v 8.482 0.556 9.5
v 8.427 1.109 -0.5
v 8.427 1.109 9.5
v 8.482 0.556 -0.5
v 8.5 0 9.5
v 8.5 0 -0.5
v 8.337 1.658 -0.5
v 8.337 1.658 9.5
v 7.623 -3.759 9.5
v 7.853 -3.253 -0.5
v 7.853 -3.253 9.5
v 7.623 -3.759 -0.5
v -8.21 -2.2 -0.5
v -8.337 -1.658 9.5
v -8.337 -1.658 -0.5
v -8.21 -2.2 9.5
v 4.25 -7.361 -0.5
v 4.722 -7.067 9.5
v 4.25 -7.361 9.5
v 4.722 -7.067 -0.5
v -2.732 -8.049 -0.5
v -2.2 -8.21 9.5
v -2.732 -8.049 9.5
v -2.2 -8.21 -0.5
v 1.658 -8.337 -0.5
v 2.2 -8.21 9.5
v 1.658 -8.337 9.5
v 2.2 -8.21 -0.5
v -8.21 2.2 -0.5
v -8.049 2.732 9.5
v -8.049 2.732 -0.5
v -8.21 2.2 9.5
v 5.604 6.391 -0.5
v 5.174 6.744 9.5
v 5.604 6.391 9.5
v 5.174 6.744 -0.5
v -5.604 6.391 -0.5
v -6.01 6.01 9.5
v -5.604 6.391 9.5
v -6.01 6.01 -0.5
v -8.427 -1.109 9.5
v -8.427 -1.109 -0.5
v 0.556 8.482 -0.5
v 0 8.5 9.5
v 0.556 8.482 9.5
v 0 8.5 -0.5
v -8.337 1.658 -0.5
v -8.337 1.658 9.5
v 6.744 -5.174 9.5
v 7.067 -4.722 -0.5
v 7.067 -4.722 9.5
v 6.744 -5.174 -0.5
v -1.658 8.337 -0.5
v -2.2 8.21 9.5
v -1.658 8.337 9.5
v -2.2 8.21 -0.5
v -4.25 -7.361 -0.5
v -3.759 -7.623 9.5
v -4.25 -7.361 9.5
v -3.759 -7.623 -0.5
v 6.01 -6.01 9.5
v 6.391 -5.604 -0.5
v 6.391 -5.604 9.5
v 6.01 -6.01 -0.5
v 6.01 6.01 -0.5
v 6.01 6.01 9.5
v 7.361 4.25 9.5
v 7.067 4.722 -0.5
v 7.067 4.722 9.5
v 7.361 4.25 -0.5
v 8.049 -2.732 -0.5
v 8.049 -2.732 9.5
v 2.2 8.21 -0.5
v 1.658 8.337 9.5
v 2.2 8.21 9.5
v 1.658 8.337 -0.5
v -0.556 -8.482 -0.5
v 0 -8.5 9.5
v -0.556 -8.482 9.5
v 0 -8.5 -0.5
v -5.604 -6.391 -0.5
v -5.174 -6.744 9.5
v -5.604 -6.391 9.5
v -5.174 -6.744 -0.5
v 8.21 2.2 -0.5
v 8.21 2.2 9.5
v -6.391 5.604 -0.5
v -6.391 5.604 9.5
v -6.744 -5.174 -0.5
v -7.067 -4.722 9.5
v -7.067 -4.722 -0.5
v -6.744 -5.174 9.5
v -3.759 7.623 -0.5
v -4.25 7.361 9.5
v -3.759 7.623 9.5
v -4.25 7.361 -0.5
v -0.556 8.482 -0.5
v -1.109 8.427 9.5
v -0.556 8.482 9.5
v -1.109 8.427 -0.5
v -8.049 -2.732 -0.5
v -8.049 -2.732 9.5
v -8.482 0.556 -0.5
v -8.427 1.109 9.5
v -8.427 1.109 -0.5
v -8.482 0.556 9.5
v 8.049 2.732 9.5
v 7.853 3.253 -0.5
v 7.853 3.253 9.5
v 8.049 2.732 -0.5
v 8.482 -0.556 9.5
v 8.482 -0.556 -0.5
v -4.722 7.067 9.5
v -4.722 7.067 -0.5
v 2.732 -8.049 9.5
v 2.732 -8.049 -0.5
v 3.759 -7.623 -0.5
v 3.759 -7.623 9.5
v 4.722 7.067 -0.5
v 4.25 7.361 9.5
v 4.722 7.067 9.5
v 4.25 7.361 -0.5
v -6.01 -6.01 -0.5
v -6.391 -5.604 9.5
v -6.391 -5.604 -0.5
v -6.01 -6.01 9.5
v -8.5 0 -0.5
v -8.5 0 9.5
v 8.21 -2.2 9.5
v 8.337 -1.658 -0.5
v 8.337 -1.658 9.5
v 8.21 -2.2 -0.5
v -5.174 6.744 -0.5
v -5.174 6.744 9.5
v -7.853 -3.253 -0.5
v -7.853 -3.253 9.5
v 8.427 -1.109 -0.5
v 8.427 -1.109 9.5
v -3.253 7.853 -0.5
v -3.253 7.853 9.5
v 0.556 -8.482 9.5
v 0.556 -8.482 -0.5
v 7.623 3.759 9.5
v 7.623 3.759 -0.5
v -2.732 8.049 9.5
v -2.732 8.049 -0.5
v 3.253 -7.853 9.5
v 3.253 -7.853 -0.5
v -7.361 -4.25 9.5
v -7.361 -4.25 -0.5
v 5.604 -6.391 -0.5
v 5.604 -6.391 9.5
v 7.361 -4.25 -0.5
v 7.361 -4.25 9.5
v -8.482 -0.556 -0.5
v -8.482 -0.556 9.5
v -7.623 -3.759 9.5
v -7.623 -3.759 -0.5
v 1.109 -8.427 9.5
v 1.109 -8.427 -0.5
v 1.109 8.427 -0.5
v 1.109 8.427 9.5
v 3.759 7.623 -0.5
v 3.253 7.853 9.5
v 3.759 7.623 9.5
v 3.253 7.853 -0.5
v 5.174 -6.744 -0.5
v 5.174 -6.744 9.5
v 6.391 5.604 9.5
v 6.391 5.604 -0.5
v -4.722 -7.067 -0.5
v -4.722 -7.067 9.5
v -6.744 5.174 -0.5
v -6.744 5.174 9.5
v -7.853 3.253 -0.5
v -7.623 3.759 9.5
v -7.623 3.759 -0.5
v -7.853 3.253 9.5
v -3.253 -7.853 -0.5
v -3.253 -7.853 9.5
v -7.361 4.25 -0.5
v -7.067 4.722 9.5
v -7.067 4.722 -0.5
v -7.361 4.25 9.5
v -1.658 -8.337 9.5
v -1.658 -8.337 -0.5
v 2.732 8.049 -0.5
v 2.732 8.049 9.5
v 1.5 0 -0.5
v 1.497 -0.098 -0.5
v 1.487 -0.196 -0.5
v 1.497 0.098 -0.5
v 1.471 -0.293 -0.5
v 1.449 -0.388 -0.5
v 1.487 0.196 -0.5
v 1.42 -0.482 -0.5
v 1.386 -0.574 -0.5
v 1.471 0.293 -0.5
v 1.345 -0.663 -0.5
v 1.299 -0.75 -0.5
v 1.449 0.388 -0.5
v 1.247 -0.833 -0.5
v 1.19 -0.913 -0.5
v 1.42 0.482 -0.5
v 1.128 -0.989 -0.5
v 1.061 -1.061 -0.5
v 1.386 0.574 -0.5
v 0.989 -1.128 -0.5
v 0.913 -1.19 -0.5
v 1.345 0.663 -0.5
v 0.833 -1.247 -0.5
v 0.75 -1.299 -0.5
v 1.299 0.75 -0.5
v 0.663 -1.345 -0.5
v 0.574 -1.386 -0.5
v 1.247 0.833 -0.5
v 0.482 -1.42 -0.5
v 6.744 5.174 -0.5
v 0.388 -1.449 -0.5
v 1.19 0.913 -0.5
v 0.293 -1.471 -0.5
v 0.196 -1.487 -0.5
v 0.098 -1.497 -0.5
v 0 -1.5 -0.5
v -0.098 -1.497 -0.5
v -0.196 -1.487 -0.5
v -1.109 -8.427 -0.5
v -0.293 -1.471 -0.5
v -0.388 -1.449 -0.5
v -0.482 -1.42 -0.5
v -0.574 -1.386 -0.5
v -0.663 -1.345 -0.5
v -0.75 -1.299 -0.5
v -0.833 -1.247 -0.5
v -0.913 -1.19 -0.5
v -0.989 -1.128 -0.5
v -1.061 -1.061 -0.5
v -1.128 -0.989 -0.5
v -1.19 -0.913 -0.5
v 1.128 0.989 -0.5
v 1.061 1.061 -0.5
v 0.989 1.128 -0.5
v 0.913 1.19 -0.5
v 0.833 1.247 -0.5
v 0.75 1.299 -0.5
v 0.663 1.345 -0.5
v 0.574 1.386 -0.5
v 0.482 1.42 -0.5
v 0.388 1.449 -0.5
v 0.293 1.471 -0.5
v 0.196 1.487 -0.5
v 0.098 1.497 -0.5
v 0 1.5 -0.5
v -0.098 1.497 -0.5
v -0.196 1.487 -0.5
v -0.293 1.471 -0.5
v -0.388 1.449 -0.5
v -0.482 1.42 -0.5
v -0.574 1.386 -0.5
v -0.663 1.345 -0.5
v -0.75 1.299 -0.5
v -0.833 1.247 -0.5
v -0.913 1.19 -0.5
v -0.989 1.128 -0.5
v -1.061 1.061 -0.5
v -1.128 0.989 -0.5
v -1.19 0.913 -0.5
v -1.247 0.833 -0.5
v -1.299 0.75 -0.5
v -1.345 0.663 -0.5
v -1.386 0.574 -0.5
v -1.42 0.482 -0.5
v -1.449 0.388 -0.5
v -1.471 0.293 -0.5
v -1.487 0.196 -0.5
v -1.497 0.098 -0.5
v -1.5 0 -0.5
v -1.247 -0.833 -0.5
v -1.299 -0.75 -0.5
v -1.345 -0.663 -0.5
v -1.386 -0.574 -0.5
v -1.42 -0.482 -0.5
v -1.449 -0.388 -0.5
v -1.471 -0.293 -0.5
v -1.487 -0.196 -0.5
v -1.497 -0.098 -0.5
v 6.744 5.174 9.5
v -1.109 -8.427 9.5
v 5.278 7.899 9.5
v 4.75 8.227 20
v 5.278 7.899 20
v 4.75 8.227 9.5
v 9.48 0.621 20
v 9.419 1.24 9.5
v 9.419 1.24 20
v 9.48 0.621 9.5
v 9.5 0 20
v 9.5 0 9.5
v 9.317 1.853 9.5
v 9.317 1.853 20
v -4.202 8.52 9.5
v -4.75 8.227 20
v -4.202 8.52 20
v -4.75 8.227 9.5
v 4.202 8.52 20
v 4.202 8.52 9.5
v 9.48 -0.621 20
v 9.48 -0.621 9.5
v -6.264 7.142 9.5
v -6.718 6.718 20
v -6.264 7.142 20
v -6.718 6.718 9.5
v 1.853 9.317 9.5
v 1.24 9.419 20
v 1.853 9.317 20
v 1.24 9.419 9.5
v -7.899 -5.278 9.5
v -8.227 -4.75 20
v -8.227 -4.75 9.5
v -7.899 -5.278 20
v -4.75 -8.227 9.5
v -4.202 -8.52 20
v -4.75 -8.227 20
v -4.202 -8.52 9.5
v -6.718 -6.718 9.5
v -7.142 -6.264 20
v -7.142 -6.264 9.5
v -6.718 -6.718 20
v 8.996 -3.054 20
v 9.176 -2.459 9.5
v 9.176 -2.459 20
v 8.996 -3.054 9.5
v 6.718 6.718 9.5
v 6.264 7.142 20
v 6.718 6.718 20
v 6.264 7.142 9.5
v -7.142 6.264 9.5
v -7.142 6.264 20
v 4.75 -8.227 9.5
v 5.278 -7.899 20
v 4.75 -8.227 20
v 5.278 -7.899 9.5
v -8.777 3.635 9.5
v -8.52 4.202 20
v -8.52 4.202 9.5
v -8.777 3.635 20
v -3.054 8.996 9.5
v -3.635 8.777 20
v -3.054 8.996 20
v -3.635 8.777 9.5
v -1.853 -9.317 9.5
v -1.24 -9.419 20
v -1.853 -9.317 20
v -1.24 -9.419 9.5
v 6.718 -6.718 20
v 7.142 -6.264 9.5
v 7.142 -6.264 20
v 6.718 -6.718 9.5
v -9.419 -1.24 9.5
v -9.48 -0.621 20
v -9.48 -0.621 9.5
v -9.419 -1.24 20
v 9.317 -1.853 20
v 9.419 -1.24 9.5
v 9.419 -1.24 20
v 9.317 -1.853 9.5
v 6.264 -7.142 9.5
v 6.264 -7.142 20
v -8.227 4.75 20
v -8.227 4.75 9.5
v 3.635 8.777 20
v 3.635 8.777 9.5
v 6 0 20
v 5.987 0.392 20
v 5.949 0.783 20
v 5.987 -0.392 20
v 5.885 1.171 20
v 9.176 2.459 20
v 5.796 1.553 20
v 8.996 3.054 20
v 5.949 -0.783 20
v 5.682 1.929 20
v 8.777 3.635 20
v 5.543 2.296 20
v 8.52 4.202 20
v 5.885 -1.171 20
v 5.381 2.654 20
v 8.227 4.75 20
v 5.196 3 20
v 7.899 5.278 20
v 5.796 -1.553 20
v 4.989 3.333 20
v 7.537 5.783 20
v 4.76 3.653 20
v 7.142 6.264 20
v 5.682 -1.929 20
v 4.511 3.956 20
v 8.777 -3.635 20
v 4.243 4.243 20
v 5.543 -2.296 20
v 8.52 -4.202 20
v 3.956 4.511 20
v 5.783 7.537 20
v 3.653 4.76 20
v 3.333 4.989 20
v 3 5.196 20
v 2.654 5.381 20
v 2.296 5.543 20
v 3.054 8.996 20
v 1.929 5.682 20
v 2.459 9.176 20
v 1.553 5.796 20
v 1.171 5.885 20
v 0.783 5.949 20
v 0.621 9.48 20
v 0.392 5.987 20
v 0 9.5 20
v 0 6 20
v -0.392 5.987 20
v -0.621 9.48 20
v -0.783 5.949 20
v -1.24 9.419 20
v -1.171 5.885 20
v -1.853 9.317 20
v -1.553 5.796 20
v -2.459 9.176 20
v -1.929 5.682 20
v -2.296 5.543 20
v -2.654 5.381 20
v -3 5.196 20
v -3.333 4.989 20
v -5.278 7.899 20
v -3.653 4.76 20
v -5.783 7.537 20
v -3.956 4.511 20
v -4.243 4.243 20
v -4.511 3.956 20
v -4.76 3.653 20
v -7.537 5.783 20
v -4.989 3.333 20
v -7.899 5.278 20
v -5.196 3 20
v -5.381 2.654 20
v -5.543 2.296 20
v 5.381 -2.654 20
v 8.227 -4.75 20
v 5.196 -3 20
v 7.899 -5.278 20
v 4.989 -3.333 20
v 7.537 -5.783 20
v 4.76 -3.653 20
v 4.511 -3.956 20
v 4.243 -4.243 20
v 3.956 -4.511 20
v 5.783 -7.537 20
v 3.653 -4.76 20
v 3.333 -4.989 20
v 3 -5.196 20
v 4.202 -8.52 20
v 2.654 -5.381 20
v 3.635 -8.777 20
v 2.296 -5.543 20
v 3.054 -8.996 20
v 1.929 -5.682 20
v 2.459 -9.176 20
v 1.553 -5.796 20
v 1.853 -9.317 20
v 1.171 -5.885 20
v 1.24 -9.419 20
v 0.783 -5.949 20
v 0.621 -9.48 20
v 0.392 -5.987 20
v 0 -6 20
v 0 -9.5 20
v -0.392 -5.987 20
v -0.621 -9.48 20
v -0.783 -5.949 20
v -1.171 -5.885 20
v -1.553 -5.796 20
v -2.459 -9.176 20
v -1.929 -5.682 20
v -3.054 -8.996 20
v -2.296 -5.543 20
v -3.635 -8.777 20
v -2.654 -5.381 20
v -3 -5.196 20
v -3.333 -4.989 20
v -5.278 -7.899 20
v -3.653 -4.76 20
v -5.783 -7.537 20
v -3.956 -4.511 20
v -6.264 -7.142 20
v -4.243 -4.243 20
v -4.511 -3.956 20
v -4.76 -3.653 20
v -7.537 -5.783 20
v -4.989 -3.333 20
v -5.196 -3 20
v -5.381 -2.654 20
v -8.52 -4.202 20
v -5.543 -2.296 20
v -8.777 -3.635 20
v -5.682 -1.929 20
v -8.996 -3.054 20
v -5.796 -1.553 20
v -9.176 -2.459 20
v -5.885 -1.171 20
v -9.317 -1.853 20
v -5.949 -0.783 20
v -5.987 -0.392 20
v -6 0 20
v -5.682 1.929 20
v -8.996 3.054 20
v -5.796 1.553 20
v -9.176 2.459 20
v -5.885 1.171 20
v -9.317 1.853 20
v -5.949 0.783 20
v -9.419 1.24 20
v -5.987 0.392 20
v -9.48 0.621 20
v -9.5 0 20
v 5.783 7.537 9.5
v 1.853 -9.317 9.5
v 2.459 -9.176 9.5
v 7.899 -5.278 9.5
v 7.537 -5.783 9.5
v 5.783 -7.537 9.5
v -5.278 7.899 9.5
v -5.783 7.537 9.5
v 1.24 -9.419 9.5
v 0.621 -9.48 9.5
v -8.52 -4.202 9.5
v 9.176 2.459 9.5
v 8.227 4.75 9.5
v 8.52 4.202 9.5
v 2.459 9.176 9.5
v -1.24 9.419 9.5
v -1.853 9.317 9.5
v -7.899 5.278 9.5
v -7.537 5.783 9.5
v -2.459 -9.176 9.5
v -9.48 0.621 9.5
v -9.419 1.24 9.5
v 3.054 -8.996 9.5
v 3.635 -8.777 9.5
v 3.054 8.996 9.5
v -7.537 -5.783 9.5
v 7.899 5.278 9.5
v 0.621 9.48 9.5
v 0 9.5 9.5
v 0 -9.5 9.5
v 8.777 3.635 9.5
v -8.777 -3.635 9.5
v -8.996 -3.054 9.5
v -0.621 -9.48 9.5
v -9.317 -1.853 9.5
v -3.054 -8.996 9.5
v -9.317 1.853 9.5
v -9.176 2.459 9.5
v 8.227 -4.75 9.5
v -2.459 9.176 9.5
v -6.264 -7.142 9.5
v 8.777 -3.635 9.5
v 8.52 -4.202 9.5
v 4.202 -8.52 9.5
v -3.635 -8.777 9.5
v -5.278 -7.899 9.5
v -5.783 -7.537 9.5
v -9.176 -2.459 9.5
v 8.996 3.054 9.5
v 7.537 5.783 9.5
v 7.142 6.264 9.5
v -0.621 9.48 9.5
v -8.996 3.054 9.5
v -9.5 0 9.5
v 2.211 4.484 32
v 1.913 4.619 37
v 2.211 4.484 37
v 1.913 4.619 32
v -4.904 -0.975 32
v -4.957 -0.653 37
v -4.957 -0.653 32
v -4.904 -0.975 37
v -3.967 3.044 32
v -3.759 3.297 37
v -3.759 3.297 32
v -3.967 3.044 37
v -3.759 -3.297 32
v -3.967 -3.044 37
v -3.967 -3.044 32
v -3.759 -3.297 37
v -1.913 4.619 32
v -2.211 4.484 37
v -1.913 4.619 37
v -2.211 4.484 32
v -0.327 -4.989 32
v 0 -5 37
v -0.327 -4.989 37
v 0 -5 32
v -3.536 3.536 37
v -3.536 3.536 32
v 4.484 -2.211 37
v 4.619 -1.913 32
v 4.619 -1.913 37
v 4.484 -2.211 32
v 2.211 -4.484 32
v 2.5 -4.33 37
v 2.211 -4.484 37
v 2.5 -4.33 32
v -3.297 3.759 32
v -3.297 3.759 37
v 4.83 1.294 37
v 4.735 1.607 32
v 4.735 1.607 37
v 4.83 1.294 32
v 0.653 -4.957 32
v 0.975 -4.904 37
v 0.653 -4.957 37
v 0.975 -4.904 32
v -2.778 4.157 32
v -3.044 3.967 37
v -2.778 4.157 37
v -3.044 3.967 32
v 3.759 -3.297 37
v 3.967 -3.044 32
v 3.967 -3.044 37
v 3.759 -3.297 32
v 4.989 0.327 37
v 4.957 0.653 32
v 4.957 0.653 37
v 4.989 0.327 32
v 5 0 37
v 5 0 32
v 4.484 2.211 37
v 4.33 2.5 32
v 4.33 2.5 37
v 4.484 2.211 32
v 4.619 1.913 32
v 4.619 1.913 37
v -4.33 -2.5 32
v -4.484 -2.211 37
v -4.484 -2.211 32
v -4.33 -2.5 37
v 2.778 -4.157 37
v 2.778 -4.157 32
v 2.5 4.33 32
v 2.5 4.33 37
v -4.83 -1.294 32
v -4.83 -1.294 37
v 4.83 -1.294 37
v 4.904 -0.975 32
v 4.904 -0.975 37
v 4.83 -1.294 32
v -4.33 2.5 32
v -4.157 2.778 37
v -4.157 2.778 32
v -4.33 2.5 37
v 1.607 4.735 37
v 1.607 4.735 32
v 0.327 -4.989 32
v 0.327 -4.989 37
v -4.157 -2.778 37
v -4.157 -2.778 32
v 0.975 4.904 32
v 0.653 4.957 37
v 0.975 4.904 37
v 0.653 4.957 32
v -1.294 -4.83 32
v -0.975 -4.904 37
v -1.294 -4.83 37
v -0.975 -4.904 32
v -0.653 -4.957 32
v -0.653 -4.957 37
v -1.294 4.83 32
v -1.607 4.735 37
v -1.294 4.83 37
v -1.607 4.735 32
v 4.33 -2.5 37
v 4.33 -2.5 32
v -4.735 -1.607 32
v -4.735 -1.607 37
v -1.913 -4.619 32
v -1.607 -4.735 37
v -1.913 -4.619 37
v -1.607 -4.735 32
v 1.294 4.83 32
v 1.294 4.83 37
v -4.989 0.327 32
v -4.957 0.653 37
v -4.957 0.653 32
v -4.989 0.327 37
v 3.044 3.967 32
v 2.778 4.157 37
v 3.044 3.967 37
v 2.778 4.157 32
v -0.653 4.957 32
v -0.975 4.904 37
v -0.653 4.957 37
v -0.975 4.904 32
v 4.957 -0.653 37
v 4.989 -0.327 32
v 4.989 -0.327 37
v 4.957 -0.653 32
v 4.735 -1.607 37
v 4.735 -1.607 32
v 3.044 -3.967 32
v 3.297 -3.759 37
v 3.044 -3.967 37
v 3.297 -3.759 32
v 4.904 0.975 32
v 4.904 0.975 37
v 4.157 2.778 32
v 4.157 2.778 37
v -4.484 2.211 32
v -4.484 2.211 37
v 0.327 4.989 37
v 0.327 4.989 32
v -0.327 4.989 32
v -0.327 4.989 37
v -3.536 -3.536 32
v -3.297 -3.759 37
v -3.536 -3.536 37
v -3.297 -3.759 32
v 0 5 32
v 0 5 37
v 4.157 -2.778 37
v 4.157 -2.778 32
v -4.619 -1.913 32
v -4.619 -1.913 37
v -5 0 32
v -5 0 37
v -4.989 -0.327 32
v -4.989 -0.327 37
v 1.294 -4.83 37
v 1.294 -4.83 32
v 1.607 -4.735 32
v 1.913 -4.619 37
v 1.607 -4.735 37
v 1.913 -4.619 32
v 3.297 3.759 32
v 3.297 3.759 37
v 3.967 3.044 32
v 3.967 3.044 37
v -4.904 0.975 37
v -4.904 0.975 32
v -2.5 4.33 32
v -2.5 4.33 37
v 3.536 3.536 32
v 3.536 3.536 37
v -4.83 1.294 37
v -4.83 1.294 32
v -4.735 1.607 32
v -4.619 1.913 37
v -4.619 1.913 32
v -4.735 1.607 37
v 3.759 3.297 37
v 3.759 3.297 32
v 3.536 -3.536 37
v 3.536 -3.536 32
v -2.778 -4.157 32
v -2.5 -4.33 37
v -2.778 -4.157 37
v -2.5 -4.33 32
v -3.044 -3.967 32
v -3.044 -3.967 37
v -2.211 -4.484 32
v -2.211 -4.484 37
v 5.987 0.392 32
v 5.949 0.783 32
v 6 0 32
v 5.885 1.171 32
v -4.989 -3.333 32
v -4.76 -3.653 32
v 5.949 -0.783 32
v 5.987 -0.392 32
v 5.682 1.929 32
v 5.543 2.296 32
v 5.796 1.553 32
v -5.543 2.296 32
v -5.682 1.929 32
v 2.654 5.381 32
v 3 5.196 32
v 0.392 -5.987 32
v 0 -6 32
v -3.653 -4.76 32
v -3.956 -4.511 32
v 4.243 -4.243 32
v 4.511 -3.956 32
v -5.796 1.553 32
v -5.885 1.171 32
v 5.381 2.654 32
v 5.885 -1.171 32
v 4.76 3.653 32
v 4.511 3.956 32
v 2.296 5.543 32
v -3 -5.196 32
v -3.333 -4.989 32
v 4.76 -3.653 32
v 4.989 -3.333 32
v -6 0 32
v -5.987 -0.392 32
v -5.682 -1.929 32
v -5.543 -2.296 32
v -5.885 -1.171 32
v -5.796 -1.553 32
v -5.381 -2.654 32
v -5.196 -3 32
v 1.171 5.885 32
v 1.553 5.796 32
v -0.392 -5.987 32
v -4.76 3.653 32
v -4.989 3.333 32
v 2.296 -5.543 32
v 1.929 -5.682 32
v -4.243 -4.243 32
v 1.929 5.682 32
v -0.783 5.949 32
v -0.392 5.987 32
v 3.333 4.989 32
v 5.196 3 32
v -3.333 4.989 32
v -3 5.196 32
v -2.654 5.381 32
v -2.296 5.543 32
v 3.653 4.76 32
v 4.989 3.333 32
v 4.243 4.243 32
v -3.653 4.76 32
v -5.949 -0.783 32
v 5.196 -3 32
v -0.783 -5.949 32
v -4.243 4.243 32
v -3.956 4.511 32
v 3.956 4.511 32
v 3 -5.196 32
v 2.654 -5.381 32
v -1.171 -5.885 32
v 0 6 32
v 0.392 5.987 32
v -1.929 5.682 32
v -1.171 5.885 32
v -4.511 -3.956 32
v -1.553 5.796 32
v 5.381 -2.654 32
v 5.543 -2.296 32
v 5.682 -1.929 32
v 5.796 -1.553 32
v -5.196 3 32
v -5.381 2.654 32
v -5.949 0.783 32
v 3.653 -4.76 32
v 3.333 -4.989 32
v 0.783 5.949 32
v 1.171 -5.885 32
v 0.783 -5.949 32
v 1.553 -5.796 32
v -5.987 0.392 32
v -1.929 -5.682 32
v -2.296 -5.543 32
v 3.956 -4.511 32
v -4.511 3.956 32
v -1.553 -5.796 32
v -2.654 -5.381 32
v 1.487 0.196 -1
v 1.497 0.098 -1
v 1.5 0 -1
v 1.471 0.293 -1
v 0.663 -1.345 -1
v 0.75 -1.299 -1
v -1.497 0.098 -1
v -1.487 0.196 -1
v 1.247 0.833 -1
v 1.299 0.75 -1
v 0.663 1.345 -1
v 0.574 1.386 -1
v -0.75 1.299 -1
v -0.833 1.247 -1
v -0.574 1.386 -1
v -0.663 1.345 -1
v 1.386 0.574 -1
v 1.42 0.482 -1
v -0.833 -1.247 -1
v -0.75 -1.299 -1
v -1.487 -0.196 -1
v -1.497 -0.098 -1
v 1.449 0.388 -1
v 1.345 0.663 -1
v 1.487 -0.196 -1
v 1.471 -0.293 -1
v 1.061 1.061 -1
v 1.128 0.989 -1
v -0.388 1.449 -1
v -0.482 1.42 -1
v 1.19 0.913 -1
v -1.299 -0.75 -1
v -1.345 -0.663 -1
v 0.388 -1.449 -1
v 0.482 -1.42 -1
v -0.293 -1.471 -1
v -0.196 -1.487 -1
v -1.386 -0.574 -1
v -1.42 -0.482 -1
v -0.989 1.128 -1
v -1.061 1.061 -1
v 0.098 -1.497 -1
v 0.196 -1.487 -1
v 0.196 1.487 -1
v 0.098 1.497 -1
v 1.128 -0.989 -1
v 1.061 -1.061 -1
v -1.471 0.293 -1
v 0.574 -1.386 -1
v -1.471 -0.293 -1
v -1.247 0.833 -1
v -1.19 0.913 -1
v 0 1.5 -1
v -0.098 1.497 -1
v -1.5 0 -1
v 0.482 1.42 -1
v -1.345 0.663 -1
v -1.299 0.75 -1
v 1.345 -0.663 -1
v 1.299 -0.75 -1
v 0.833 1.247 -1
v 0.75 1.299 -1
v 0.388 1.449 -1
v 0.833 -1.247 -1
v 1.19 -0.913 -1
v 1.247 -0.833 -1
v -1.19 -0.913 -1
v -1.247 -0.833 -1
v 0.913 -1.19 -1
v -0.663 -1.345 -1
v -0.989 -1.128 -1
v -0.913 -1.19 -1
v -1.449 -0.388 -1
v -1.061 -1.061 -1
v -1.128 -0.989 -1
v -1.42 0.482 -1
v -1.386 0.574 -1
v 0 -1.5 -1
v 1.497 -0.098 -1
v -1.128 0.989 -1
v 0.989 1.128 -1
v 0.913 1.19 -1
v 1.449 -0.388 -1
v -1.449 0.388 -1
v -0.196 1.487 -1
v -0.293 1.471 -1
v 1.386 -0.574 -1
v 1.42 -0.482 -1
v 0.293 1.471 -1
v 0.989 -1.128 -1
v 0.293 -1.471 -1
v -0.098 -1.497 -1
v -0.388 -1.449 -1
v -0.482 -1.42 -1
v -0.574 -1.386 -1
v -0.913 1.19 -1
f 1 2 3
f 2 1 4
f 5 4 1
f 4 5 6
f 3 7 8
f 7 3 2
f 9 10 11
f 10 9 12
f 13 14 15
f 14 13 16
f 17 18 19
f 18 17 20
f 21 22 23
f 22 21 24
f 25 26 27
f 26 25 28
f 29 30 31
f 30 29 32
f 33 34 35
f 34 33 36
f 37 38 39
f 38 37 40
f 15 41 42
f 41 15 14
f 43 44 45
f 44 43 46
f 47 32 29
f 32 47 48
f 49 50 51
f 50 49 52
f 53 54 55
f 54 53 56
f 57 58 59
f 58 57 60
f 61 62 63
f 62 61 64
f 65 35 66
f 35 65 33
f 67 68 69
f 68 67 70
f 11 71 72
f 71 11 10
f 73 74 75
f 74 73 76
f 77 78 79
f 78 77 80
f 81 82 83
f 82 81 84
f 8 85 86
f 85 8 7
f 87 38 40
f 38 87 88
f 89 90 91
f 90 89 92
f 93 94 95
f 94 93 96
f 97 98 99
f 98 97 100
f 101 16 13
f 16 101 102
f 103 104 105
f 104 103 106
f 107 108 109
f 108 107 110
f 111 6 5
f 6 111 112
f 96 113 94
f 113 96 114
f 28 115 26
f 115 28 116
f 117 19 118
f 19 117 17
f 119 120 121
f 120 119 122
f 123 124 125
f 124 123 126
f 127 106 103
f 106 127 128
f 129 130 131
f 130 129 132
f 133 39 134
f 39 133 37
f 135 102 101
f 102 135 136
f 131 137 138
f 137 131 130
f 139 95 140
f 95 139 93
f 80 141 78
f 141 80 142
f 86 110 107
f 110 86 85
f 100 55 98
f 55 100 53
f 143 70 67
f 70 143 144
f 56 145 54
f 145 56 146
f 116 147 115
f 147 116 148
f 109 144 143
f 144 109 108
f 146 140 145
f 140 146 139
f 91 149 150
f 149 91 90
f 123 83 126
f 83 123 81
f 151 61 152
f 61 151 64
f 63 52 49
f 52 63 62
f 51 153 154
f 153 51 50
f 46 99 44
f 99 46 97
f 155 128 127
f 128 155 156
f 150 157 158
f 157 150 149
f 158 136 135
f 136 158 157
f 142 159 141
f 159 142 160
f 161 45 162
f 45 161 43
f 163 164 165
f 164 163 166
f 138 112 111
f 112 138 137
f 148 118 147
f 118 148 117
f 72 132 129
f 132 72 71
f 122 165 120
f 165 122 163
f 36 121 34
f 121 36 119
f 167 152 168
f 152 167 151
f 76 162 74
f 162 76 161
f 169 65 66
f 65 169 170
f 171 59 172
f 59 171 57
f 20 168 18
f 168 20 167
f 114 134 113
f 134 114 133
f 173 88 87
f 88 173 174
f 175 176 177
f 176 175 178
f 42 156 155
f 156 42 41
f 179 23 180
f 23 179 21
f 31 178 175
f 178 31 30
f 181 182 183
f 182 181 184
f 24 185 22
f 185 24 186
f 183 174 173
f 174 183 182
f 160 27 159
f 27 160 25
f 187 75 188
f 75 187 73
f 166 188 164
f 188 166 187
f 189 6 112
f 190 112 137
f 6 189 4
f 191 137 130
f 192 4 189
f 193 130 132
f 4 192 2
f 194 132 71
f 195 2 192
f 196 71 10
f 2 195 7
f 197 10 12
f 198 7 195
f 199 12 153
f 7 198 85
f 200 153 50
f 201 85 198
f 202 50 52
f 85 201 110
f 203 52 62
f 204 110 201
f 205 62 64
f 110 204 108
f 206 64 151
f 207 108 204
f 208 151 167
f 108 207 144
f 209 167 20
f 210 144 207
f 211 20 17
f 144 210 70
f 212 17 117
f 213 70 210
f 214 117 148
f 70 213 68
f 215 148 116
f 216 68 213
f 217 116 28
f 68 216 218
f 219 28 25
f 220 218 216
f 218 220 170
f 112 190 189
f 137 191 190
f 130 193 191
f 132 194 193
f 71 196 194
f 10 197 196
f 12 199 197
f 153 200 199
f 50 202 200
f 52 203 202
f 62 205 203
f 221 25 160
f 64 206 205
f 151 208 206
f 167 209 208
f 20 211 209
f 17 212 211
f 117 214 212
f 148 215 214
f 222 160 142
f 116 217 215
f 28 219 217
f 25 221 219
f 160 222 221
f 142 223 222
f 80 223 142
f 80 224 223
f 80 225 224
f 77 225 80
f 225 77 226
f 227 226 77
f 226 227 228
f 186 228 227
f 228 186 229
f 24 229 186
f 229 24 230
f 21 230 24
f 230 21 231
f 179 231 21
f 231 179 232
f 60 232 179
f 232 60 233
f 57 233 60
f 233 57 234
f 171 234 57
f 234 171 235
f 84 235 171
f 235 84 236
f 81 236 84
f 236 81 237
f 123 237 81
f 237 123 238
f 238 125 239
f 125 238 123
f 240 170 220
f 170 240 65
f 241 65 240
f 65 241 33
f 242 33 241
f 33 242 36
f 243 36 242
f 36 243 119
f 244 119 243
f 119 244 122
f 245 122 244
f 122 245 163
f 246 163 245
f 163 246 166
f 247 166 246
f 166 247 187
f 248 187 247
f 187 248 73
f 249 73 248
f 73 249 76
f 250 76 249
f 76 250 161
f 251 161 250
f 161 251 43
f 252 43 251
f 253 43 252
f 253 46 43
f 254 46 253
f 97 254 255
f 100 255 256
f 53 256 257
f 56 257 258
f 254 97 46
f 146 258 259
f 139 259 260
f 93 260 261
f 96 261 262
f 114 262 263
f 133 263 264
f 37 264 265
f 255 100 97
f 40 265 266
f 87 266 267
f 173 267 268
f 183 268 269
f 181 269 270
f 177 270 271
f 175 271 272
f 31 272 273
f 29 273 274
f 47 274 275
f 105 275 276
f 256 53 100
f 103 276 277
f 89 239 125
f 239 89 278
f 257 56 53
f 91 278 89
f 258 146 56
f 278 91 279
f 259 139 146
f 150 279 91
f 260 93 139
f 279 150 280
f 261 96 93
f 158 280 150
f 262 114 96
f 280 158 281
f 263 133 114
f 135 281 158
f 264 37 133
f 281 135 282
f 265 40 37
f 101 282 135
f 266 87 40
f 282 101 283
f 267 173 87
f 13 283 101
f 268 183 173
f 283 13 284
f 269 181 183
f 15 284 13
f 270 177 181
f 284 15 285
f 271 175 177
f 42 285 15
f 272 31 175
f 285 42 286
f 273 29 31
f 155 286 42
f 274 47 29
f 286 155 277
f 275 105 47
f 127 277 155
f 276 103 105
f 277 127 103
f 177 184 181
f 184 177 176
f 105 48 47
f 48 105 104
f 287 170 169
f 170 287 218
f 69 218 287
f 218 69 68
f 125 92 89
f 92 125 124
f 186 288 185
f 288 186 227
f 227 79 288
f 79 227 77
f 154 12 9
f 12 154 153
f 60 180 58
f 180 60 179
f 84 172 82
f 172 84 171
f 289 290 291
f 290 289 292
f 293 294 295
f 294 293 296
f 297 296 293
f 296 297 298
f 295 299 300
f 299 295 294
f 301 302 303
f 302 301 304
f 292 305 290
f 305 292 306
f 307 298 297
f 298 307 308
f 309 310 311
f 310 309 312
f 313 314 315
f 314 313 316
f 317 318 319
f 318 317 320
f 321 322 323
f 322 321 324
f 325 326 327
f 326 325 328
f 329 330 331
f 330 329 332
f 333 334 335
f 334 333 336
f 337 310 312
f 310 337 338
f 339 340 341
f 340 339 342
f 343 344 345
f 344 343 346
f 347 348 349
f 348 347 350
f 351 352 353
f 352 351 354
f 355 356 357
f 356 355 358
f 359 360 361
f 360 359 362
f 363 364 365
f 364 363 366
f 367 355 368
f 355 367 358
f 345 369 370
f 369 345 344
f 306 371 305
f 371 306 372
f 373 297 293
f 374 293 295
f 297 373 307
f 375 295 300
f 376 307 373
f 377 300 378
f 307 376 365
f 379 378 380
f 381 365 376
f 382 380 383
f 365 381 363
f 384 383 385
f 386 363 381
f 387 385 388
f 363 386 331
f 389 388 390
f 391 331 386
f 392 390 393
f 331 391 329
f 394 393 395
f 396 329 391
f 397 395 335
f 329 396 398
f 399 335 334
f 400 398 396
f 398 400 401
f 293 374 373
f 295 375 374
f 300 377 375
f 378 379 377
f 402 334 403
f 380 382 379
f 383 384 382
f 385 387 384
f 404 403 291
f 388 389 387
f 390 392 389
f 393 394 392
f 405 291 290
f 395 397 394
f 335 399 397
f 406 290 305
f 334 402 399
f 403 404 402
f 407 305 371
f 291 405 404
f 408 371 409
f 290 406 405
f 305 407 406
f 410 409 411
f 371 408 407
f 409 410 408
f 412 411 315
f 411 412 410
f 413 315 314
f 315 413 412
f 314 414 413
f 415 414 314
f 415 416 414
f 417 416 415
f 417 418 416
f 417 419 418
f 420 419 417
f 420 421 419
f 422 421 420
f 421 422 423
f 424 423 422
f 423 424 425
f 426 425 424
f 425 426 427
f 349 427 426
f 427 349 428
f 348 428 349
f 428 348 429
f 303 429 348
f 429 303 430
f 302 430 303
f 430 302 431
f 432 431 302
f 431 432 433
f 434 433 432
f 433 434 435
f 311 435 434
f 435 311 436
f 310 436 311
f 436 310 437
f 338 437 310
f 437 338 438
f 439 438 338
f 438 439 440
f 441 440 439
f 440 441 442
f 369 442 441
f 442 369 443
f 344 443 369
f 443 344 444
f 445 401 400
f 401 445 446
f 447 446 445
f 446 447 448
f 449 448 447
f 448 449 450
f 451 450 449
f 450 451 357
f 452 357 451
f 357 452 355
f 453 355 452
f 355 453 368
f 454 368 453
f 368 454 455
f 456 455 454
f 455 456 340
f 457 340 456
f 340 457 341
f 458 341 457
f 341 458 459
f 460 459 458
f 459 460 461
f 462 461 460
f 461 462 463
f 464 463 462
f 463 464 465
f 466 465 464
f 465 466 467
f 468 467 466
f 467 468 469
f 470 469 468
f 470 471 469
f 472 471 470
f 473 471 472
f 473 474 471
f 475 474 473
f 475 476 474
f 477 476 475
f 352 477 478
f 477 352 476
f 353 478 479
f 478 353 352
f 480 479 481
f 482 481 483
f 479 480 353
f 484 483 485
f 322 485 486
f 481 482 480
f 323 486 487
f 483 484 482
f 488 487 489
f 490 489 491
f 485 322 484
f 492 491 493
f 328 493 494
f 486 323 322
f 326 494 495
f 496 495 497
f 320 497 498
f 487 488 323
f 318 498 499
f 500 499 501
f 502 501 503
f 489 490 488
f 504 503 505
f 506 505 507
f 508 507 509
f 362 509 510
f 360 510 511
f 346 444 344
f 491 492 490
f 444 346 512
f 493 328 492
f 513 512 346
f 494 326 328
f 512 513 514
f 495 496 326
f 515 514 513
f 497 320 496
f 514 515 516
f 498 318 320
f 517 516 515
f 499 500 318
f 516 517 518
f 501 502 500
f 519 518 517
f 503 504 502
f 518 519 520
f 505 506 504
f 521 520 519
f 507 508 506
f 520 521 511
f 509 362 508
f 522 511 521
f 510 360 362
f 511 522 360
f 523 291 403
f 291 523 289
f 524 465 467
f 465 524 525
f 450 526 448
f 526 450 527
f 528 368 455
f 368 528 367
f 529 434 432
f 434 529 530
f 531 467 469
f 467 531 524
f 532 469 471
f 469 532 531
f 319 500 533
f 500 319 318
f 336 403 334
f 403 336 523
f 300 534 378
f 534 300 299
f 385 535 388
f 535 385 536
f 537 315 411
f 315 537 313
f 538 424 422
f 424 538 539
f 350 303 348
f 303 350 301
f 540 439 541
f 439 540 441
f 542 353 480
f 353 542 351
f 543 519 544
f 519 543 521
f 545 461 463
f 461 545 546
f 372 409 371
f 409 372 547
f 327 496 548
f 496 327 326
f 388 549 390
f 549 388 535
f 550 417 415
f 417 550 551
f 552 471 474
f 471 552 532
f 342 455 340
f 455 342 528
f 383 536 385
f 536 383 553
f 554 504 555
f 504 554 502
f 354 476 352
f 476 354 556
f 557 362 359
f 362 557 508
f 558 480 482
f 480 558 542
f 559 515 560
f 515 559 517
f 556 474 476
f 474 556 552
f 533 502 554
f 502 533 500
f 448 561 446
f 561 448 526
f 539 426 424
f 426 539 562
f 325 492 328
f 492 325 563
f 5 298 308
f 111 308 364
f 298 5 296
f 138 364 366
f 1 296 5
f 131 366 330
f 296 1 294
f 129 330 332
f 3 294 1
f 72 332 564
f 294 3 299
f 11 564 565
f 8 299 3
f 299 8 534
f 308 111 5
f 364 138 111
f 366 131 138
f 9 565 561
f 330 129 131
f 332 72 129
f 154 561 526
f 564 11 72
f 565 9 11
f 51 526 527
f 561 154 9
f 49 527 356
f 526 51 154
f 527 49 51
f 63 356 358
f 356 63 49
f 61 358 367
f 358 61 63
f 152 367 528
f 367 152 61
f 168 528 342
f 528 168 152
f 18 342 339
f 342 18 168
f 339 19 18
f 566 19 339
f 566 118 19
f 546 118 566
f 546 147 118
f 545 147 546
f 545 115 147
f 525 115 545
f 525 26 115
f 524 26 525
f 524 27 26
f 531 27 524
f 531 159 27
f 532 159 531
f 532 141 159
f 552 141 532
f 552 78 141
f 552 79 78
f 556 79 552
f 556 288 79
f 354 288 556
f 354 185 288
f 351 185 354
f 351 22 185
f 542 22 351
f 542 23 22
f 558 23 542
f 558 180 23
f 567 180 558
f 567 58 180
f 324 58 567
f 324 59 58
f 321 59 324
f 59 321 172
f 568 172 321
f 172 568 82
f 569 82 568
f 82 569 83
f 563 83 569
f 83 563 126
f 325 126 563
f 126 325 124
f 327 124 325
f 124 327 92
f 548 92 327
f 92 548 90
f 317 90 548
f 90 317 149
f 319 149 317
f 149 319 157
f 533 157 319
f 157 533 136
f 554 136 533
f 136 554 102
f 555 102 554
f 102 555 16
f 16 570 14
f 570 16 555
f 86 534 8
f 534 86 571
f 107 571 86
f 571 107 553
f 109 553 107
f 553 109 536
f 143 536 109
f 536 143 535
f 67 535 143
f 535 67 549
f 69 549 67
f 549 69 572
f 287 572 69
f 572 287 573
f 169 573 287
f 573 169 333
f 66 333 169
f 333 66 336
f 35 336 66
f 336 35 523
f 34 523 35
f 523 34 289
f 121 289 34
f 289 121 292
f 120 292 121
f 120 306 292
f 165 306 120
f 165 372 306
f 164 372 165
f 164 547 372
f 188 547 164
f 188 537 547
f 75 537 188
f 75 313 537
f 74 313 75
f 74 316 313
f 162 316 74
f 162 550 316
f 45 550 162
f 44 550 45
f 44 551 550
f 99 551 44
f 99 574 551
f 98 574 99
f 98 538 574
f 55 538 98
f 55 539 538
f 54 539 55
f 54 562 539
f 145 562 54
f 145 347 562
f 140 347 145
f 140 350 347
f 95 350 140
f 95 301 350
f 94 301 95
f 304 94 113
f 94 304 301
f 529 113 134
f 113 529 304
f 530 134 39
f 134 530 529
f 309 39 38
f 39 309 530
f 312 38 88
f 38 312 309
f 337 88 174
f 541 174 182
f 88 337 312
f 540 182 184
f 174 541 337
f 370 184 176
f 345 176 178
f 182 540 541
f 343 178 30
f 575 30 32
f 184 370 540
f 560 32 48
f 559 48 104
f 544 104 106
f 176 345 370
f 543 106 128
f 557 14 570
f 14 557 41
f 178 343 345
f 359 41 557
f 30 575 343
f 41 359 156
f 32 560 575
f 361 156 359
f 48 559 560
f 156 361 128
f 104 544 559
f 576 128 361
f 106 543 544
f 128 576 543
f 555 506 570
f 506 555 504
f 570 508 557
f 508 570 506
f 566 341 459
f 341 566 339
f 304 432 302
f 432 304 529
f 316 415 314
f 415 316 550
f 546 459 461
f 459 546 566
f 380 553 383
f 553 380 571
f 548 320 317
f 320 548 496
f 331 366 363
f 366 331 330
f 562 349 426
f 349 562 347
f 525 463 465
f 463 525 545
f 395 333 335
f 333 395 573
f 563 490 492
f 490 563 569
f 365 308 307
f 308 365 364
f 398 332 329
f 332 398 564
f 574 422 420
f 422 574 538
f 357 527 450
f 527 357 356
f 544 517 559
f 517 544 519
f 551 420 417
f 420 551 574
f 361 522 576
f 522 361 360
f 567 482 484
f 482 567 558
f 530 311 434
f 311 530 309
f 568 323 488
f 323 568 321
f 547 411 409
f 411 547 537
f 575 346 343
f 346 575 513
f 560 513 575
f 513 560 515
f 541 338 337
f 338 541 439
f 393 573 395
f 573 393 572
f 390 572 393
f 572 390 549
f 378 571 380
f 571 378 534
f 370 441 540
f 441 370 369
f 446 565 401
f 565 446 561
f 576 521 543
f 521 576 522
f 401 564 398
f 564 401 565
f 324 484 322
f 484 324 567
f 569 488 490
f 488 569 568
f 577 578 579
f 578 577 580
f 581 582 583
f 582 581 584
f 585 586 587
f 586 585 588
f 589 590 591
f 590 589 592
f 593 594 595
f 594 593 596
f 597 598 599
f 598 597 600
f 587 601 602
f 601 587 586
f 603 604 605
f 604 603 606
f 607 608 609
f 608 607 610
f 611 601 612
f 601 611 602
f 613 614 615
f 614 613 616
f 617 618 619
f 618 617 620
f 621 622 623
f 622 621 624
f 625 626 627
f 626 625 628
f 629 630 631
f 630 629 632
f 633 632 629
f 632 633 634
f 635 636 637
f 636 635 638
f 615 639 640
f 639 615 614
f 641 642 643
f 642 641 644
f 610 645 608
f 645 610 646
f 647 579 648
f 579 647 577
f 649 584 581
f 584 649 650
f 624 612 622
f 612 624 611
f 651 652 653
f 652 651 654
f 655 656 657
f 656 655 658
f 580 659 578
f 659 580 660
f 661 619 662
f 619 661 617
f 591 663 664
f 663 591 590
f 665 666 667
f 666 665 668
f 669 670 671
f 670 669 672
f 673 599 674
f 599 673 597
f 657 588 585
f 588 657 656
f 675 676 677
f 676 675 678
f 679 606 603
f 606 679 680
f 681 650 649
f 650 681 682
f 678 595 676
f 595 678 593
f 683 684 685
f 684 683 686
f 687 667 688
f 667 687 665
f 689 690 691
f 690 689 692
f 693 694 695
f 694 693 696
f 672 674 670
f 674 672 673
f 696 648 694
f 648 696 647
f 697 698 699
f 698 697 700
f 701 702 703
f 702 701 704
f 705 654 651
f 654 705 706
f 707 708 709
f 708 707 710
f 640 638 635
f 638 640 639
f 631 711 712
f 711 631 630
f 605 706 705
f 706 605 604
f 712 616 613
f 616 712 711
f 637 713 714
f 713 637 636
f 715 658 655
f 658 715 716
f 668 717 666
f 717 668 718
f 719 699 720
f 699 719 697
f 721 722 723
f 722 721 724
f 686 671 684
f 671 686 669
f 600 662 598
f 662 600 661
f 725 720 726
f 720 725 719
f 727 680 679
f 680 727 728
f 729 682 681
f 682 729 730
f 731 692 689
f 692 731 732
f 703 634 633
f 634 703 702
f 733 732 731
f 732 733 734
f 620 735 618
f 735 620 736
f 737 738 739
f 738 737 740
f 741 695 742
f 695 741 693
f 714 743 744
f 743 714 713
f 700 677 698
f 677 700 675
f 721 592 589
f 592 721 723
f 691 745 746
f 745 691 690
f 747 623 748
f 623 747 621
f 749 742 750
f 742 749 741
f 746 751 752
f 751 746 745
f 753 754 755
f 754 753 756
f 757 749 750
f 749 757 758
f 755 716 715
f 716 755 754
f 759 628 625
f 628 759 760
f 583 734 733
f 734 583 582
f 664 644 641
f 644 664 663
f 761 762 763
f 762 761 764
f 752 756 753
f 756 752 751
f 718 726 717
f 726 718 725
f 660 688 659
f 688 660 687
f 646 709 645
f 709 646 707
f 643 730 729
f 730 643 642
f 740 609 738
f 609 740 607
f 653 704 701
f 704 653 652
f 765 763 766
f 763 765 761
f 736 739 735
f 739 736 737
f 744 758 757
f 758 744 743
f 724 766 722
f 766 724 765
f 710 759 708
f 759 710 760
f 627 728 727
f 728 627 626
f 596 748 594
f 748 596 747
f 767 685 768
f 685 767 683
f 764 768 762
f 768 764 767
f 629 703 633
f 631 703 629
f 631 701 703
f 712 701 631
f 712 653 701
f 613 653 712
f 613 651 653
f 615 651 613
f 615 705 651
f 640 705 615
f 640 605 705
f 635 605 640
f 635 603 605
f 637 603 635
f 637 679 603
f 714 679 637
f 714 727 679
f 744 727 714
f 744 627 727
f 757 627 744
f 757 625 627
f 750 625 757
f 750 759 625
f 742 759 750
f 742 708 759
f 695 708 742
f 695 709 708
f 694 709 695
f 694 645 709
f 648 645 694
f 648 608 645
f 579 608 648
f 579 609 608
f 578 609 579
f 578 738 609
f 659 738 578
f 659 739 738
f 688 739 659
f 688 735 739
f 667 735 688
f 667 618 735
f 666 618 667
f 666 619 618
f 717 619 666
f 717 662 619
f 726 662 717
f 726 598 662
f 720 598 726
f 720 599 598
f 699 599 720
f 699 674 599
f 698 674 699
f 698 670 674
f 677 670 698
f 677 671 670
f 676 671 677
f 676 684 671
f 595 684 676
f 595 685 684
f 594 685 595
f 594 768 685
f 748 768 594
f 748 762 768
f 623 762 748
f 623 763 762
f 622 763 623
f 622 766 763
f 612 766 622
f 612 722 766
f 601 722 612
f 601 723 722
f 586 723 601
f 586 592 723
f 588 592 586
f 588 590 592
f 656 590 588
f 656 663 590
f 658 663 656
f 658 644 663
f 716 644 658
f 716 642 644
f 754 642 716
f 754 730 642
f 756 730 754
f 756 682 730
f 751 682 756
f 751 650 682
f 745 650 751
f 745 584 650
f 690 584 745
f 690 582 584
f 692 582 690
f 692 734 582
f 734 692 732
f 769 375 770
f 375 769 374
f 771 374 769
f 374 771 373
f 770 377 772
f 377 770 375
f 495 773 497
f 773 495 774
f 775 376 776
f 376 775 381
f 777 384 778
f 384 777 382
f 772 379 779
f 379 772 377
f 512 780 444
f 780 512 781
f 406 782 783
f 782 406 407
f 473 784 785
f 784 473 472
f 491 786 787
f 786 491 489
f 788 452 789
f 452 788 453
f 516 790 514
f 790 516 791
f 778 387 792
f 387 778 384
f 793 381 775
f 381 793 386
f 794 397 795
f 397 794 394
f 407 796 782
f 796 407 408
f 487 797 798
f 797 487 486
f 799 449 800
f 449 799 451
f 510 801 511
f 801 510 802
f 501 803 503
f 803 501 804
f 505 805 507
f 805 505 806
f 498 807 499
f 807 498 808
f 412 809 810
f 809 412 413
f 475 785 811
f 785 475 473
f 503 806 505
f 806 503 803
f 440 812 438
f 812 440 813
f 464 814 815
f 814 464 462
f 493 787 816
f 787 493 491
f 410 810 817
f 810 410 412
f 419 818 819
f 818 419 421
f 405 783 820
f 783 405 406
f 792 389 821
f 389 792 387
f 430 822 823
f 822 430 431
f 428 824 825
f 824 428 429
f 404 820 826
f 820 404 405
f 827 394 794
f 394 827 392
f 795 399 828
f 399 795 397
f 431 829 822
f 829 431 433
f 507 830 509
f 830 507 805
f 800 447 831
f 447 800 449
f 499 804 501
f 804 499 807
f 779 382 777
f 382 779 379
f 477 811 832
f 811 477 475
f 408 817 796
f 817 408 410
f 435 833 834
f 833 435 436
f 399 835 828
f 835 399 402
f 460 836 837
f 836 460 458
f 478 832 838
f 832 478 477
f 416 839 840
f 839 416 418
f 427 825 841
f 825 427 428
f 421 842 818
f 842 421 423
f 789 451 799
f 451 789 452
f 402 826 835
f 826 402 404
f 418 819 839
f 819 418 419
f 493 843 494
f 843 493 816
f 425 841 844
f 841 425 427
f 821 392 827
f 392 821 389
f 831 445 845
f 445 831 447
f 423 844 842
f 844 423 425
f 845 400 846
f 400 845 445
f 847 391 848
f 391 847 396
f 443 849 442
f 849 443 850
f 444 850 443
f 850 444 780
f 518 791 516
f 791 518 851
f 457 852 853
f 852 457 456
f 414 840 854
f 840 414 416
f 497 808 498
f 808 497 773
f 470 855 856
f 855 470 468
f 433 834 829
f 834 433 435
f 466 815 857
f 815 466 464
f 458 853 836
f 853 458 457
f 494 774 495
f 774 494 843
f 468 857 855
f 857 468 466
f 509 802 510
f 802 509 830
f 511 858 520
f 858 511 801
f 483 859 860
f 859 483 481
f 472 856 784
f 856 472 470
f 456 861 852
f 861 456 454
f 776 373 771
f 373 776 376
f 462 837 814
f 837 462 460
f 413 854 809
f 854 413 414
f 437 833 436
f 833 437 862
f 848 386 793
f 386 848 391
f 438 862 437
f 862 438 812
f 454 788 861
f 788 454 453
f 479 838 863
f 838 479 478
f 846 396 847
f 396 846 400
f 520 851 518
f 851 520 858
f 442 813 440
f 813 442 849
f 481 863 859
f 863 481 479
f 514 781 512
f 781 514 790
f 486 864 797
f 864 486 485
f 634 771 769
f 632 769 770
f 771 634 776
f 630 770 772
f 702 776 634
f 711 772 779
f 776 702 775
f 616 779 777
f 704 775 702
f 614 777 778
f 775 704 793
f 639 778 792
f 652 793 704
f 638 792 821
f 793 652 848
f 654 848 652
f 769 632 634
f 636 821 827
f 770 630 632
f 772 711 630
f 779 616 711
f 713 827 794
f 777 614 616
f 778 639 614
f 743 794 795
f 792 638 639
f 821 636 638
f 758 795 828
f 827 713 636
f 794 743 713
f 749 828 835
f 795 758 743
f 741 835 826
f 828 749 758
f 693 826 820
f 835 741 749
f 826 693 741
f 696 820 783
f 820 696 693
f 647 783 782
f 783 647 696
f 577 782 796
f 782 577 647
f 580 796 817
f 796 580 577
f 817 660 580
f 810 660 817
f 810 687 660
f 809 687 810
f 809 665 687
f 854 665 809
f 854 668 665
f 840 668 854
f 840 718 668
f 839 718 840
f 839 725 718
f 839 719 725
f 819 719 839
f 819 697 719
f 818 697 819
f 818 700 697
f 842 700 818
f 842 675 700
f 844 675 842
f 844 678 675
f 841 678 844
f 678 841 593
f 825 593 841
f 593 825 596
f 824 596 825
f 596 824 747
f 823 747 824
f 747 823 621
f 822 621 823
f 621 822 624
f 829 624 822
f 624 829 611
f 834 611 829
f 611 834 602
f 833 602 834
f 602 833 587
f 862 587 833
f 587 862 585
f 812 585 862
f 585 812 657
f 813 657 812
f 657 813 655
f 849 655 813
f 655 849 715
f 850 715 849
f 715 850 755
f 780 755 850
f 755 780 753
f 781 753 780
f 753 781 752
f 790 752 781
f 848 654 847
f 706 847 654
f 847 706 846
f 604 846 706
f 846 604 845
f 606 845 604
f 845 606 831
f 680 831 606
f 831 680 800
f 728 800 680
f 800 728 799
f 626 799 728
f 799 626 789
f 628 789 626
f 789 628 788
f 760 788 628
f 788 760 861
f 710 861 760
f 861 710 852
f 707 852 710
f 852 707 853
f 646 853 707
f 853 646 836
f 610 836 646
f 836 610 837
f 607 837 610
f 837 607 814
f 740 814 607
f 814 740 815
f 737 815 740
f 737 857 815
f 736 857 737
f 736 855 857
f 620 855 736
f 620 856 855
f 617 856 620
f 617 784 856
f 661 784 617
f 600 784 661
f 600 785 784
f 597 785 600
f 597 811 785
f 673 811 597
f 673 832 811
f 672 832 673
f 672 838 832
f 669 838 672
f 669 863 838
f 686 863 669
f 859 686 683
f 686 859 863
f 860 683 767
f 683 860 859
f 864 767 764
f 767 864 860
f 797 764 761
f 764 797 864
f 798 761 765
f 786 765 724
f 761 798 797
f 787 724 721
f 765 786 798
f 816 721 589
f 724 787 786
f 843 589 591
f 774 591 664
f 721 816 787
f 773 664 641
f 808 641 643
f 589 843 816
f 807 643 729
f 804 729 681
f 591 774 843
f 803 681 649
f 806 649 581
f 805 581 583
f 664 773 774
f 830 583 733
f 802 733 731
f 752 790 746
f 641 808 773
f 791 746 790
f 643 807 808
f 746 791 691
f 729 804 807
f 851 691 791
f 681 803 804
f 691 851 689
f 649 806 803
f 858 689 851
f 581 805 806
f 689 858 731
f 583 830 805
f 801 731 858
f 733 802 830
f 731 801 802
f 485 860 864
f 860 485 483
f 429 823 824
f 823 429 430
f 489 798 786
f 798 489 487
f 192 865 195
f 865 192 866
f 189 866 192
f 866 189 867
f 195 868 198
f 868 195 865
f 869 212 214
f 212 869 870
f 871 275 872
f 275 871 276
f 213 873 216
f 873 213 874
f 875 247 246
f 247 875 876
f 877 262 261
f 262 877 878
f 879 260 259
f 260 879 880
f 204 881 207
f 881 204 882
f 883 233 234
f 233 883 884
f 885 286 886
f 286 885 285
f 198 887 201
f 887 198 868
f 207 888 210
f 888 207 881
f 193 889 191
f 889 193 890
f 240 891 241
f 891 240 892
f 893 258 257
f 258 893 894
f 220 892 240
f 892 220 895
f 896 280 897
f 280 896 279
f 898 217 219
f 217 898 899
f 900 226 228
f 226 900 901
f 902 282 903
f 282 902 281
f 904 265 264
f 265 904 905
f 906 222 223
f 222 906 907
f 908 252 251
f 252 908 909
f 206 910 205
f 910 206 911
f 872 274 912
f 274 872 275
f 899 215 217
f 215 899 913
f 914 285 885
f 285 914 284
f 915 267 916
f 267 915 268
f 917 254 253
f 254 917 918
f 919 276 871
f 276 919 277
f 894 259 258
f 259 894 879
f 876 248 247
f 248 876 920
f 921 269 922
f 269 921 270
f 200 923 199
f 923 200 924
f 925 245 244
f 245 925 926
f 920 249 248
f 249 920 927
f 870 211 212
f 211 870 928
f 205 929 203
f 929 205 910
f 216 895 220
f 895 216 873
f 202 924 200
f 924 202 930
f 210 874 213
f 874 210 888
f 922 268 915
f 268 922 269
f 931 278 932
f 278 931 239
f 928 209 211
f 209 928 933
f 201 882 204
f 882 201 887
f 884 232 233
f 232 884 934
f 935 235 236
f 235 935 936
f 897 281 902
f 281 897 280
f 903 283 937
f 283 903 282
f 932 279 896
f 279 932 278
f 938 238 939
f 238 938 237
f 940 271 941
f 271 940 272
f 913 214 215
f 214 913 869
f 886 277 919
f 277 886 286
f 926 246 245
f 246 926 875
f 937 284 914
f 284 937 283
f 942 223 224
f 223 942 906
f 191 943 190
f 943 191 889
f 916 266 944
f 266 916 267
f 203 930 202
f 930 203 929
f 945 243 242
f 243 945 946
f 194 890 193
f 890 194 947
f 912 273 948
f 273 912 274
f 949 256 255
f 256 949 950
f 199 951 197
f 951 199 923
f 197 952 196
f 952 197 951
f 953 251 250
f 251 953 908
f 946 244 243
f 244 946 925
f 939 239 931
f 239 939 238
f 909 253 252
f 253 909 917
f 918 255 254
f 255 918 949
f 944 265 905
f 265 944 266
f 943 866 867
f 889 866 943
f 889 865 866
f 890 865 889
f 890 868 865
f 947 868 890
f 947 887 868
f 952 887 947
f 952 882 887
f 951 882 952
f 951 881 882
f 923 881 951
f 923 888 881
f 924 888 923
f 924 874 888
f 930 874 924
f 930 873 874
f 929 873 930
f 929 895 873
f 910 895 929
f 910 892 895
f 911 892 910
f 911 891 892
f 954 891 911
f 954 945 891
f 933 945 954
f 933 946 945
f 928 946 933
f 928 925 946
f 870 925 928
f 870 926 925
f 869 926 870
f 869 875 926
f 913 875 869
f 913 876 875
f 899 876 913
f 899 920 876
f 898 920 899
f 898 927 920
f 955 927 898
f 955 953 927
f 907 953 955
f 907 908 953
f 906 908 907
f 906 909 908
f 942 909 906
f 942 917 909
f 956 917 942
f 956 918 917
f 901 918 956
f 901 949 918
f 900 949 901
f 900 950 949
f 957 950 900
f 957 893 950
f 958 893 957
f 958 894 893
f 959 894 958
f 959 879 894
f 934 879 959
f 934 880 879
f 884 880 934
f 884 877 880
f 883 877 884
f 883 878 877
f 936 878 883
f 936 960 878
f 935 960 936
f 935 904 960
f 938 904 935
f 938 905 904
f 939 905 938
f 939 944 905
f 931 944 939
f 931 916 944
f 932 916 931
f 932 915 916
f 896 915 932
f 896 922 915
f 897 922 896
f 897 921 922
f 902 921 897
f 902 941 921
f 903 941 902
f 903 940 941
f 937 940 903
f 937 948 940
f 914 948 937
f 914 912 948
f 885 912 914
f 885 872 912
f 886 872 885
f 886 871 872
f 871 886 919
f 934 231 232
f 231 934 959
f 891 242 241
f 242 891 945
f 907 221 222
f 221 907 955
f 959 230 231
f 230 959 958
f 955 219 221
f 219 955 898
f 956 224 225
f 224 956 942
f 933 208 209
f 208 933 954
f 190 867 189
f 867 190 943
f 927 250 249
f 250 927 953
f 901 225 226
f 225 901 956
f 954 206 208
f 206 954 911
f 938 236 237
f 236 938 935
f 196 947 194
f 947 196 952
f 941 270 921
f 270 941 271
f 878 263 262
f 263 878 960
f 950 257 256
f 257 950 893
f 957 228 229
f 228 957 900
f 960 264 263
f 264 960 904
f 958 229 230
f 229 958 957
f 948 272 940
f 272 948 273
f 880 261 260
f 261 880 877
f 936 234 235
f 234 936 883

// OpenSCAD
// Straight hose-barb reducer: 8 mm tubing (z = 0..20) -> 5 mm tubing (z = 25..41)
// Print orientation: standing upright along +Z, centred on the origin in X/Y.
// Units: mm. Bore: 3 mm through the full length.

// ---------------- Parameters ----------------
reducer_in_d     = 8;    // inlet tubing inner diameter
reducer_out_d    = 5;    // outlet tubing inner diameter
reducer_bore_d   = 3;    // through-bore diameter
reducer_barb_n   = 2;    // number of barbs per end (stacked)
reducer_len_in   = 20;   // inlet section length (z = 0..20)
reducer_len_out  = 16;   // outlet section length (z = 25..41)
reducer_collar_d = 12;   // intermediate collar diameter (z = 20..25)
reducer_overlap  = 0.5;  // overlap between adjacent barbs / collar (avoid coplanar faces)

$fn = 96;                // curve resolution

// ---------------- Derived ----------------
in_barb_h = 10;          // 8 mm barb height
out_barb_h = 8;          // 5 mm barb height
in_barb_od0 = 7.5;       // 8 mm barb outer diameter at bottom
in_barb_od1 = 9.5;       // 8 mm barb outer diameter at top
out_barb_od0 = 6.5;      // 5 mm barb outer diameter at bottom
out_barb_od1 = 5.0;      // 5 mm barb outer diameter at top

// ---------------- Model ----------------
module hose_barb_reducer() {
    union() {
        // Inlet barbs (z = 0..20)
        for (i = [0 : reducer_barb_n - 1]) {
            translate([0, 0, i * in_barb_h - reducer_overlap])
                cylinder(h = in_barb_h + reducer_overlap,
                           r = in_barb_od0 + (i + 1) * (in_barb_od1 - in_barb_od0) / reducer_barb_n);
        }

        // Intermediate collar (z = 20..25)
        translate([0, 0, reducer_len_in])
            cylinder(h = reducer_collar_d, r = reducer_collar_d / 2);

        // Outlet barbs (z = 25..41)
        for (i = [0 : reducer_barb_n - 1]) {
            translate([0, 0, reducer_len_in + reducer_overlap + i * out_barb_h])
                cylinder(h = out_barb_h + reducer_overlap,
                           r = out_barb_od0 + (i + 1) * (out_barb_od1 - out_barb_od0) / reducer_barb_n);
        }

        // Through bore
        translate([0, 0, -1])
            cylinder(h = reducer_len_in + reducer_overlap + out_barb_h + 2,
                           r = reducer_bore_d / 2);
    }
}

hose_barb_reducer();
